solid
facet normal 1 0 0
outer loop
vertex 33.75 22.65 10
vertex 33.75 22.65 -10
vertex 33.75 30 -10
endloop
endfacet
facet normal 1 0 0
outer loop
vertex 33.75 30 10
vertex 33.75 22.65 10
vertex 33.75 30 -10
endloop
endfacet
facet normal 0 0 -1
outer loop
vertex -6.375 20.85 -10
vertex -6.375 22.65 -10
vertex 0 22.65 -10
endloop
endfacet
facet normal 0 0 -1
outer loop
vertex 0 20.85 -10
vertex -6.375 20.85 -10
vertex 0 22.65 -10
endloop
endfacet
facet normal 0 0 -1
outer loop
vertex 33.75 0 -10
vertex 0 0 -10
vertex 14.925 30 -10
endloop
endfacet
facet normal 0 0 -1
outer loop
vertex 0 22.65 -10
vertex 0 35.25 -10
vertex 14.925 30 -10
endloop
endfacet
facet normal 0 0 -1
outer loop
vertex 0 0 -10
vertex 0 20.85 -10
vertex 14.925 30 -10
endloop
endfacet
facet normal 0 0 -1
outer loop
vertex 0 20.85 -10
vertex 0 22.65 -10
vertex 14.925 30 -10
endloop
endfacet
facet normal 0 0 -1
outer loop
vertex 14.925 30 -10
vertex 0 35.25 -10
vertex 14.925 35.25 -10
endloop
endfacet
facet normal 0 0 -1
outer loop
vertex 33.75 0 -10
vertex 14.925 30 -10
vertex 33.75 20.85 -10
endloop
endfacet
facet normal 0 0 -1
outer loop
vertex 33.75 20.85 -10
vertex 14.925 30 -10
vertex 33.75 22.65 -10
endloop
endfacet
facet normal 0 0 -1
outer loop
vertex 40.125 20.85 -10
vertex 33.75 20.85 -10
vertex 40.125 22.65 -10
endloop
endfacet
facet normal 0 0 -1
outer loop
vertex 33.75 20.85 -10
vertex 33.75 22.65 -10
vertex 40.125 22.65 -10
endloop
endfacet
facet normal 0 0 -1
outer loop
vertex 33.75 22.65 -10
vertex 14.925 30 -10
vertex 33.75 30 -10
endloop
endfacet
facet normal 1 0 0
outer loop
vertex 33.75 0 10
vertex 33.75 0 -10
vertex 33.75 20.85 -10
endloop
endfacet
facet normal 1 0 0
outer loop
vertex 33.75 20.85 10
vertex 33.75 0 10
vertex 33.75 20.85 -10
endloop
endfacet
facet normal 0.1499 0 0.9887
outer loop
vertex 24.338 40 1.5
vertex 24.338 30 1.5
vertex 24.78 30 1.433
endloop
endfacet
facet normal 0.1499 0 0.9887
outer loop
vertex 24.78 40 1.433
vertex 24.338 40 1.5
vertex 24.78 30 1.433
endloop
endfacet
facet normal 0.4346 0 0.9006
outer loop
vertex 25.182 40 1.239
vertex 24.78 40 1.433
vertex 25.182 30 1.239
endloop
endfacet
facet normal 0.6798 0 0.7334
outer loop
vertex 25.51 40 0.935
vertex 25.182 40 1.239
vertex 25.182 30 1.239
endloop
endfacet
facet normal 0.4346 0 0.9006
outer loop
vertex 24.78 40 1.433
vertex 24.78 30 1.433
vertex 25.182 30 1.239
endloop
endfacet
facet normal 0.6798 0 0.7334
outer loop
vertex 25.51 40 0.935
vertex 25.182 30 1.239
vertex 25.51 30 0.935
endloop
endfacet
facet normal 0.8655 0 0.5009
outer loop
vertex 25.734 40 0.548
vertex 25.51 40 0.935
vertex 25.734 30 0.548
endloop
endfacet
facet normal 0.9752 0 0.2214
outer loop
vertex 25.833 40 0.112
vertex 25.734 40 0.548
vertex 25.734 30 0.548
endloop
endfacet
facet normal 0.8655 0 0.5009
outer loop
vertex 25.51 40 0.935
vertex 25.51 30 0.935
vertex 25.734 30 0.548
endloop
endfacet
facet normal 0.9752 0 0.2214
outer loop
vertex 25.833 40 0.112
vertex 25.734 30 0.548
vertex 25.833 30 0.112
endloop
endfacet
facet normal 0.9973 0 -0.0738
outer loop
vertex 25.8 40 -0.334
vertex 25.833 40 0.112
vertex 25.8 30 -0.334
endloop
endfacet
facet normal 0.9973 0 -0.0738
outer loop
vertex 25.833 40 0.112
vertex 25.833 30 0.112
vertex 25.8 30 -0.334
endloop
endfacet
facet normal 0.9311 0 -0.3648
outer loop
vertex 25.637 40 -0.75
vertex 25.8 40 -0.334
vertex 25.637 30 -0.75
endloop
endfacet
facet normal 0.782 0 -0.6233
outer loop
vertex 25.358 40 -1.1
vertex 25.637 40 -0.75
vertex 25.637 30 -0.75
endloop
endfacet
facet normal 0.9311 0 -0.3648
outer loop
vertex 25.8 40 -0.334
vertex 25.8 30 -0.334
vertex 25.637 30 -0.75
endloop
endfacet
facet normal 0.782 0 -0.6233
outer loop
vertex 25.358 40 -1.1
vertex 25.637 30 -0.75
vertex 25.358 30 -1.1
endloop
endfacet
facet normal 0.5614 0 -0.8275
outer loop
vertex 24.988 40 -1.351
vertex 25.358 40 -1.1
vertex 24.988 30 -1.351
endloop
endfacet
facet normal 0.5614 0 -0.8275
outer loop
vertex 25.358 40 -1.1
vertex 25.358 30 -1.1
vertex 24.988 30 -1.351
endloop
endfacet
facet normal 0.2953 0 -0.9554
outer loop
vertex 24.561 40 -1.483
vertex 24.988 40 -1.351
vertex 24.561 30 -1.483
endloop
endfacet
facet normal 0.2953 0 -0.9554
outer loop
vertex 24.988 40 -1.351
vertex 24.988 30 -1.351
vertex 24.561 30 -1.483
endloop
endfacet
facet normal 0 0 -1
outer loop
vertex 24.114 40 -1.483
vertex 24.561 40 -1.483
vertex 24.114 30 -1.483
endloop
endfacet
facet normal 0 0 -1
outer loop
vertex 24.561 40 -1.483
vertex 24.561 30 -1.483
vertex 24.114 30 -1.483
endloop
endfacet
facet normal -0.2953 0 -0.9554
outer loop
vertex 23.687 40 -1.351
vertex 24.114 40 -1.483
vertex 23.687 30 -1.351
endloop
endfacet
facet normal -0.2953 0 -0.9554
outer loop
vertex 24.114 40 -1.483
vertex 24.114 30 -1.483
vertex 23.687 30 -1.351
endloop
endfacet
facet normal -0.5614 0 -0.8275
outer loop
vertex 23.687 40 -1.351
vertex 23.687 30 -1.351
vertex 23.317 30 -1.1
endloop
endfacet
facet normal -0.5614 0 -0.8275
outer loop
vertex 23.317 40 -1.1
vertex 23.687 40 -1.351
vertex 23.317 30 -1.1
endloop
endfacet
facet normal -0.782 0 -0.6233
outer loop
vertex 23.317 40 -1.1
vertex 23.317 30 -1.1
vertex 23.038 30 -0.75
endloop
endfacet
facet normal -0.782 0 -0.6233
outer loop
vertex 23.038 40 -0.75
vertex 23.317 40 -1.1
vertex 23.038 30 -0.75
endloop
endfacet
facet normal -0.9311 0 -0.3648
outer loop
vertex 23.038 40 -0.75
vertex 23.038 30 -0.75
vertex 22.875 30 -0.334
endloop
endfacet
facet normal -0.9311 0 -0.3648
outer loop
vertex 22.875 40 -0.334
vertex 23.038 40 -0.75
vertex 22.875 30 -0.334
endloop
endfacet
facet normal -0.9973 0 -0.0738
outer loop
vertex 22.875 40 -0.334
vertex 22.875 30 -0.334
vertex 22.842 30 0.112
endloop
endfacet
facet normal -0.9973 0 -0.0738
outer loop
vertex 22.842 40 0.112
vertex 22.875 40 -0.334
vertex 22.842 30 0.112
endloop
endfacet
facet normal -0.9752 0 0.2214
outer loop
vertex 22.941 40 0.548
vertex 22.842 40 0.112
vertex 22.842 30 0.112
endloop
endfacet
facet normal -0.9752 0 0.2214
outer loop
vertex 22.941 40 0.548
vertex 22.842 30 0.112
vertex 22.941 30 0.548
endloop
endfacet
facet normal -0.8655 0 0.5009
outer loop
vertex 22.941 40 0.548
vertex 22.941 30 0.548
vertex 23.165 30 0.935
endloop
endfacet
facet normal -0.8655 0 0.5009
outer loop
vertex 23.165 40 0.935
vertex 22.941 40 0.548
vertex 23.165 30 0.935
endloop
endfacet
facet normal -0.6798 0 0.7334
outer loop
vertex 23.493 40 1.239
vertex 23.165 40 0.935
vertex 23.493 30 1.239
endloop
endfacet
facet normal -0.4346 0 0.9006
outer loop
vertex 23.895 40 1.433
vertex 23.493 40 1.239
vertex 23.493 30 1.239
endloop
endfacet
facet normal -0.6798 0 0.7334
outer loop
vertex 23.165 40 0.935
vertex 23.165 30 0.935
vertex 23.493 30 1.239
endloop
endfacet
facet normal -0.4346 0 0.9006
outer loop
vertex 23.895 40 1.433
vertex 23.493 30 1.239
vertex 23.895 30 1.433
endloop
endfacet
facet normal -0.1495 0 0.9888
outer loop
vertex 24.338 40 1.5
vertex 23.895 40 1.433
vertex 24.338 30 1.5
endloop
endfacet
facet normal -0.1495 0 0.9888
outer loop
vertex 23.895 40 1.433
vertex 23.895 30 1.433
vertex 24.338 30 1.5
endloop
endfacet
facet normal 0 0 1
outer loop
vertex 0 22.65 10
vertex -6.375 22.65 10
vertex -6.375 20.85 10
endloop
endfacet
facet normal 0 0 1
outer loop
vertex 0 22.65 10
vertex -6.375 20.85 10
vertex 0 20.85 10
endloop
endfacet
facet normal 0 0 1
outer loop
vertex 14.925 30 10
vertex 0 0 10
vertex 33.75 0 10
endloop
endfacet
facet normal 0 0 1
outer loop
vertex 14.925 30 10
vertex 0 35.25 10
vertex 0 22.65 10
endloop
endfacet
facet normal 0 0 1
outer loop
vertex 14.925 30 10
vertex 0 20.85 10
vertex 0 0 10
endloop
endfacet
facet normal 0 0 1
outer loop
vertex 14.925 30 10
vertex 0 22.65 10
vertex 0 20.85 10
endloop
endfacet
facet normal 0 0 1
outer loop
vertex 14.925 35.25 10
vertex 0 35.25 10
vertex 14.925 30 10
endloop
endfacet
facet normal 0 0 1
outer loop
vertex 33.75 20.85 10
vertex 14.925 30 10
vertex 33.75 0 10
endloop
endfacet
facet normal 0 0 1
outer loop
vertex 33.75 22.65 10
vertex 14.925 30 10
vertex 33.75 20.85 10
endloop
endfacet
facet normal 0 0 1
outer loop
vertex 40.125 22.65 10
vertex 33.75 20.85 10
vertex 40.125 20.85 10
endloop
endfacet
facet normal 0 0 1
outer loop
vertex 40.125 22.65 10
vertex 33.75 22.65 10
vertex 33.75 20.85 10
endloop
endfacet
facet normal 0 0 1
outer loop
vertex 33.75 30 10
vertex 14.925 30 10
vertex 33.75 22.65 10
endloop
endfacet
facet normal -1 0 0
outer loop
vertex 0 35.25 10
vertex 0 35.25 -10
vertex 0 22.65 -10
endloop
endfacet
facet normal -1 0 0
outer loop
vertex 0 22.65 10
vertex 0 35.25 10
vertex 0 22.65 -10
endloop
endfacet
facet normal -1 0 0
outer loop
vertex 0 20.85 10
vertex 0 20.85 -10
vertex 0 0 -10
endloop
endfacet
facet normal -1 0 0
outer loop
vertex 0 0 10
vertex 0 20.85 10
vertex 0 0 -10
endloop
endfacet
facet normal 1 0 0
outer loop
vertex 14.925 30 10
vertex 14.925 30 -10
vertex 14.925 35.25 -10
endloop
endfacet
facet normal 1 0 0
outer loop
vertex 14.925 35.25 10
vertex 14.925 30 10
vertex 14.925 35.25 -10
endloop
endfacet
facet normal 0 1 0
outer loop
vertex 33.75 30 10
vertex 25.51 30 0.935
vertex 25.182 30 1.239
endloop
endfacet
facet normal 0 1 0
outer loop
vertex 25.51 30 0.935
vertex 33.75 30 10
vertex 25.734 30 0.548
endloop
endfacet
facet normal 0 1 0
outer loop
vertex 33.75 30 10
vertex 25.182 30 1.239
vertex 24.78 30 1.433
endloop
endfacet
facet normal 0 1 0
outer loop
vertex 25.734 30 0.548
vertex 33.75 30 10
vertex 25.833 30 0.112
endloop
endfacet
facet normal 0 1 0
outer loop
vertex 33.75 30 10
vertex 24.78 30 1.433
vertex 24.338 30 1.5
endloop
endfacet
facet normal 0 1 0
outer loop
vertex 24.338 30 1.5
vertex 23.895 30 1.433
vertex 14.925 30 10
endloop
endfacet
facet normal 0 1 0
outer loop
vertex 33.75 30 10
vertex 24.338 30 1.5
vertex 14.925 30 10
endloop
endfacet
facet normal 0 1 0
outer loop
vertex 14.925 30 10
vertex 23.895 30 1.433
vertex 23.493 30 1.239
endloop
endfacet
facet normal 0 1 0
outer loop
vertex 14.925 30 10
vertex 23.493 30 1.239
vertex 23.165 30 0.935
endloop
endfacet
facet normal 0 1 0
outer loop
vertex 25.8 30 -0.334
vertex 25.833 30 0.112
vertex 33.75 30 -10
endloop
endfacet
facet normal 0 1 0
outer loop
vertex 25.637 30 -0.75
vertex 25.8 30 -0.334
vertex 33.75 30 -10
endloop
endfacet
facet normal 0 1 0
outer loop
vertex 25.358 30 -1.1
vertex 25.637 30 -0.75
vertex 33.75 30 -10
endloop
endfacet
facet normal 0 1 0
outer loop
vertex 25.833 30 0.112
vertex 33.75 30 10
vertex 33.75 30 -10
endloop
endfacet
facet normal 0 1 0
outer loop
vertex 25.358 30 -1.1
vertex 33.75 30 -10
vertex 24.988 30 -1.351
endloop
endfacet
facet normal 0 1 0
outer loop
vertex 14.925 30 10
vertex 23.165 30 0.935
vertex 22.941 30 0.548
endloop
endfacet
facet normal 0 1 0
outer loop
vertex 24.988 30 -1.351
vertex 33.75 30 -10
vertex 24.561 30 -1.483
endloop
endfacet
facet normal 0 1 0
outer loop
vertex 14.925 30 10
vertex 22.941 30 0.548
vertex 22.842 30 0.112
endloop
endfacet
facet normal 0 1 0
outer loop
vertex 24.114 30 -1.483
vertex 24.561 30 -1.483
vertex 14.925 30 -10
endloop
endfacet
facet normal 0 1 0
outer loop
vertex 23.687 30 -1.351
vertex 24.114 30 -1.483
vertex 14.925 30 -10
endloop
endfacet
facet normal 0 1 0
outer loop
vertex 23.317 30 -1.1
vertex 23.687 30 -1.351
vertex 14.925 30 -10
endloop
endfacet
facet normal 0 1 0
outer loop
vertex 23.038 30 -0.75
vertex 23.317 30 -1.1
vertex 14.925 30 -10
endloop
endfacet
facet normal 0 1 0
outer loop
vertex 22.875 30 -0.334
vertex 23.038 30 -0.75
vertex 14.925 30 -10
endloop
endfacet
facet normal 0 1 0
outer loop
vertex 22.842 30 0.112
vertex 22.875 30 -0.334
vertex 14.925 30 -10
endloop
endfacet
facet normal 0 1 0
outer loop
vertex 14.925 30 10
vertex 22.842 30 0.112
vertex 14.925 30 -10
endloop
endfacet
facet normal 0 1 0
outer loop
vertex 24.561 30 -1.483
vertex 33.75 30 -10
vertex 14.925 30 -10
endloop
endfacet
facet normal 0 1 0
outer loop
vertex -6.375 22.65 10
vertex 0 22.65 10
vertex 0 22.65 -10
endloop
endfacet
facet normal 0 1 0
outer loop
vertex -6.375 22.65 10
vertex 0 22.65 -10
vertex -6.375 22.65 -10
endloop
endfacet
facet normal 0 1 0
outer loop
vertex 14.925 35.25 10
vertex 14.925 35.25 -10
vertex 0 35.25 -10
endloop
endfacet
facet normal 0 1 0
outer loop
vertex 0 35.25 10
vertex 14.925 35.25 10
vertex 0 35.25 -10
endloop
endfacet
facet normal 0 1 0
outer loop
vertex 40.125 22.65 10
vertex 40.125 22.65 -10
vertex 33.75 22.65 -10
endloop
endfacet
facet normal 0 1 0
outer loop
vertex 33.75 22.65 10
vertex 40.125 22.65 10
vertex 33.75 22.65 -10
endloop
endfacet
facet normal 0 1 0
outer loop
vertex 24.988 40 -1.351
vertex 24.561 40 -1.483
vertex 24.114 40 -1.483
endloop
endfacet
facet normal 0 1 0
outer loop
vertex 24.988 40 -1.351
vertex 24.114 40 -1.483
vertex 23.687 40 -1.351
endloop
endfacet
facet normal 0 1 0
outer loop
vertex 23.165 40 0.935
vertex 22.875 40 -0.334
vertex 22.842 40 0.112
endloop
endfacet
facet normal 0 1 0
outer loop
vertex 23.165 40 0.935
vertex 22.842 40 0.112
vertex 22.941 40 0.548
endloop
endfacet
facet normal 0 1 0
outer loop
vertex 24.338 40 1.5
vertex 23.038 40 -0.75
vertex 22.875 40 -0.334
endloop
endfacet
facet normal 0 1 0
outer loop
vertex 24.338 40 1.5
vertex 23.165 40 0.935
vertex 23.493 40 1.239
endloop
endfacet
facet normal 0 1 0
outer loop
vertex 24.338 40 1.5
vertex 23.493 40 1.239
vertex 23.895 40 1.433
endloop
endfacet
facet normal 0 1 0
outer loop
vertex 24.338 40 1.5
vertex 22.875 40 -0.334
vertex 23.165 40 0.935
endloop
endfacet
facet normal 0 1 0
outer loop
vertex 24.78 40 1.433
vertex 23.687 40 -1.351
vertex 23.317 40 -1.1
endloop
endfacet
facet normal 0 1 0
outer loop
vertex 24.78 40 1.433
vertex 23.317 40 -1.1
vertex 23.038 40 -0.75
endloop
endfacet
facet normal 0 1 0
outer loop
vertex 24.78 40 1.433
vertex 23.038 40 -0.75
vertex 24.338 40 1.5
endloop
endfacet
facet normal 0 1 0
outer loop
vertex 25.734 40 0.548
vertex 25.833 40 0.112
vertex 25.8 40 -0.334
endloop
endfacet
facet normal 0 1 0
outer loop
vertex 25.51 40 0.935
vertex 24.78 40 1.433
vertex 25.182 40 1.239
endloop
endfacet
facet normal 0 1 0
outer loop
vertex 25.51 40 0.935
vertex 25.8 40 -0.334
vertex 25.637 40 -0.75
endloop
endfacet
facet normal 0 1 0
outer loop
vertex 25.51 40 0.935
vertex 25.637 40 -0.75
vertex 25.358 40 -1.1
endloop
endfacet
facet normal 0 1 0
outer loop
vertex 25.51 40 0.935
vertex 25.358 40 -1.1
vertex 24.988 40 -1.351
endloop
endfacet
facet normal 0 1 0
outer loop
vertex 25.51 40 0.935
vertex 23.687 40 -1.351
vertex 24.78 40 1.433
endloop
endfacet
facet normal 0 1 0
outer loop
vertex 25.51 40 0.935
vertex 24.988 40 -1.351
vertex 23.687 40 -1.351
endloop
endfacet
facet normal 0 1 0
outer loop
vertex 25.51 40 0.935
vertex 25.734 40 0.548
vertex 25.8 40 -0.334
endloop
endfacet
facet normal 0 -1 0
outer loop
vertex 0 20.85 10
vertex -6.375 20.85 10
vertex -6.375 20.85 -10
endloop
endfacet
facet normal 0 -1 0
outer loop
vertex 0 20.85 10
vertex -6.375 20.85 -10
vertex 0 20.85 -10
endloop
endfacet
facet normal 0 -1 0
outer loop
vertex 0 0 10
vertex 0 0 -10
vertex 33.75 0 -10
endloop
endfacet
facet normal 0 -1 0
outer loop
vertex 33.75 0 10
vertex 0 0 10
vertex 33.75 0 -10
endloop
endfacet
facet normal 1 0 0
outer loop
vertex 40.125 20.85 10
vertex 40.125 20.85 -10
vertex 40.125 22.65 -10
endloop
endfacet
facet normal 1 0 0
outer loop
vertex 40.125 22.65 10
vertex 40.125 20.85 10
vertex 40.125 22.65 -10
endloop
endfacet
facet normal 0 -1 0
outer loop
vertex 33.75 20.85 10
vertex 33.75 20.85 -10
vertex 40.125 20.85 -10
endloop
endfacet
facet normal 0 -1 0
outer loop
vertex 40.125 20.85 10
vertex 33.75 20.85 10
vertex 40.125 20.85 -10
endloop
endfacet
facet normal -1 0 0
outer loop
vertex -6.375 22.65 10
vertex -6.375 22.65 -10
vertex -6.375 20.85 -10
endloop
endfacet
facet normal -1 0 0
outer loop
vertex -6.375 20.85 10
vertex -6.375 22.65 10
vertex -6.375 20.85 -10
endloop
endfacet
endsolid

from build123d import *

# Parameters (mm, degrees)
BOSS_EXTRU_1_DEPTH      = 10
BOSS_EXTRU_1_DEPTH_BACK = 10
ESQUISSE3_R             = 1.5
BOSS_EXTRU_2_DEPTH      = 10


with BuildPart() as part:
    # Esquisse1 → Boss.-Extru.1 (new, two sides: drawn at the far end of the back side and taken through both)
    with BuildSketch(Plane.XY.offset(-BOSS_EXTRU_1_DEPTH_BACK)):
        Polygon((0, 0), (33.75, 0), (33.75, 20.85), (40.125, 20.85), (40.125, 22.65), (33.75, 22.65), (33.75, 30), (14.925, 30), (14.925, 35.25), (0, 35.25), (0, 22.65), (-6.375, 22.65), (-6.375, 20.85), (0, 20.85), align=None)
    extrude(amount=BOSS_EXTRU_1_DEPTH + BOSS_EXTRU_1_DEPTH_BACK)

    # Esquisse3 → Boss.-Extru.2 (add)
    with BuildSketch(Plane(origin=(0, 30, 0), x_dir=(1, 0, 0), z_dir=(0, 1, 0))):
        with Locations((24.3375, 0)):
            Circle(ESQUISSE3_R)
    extrude(amount=BOSS_EXTRU_2_DEPTH)


solid = part.part
